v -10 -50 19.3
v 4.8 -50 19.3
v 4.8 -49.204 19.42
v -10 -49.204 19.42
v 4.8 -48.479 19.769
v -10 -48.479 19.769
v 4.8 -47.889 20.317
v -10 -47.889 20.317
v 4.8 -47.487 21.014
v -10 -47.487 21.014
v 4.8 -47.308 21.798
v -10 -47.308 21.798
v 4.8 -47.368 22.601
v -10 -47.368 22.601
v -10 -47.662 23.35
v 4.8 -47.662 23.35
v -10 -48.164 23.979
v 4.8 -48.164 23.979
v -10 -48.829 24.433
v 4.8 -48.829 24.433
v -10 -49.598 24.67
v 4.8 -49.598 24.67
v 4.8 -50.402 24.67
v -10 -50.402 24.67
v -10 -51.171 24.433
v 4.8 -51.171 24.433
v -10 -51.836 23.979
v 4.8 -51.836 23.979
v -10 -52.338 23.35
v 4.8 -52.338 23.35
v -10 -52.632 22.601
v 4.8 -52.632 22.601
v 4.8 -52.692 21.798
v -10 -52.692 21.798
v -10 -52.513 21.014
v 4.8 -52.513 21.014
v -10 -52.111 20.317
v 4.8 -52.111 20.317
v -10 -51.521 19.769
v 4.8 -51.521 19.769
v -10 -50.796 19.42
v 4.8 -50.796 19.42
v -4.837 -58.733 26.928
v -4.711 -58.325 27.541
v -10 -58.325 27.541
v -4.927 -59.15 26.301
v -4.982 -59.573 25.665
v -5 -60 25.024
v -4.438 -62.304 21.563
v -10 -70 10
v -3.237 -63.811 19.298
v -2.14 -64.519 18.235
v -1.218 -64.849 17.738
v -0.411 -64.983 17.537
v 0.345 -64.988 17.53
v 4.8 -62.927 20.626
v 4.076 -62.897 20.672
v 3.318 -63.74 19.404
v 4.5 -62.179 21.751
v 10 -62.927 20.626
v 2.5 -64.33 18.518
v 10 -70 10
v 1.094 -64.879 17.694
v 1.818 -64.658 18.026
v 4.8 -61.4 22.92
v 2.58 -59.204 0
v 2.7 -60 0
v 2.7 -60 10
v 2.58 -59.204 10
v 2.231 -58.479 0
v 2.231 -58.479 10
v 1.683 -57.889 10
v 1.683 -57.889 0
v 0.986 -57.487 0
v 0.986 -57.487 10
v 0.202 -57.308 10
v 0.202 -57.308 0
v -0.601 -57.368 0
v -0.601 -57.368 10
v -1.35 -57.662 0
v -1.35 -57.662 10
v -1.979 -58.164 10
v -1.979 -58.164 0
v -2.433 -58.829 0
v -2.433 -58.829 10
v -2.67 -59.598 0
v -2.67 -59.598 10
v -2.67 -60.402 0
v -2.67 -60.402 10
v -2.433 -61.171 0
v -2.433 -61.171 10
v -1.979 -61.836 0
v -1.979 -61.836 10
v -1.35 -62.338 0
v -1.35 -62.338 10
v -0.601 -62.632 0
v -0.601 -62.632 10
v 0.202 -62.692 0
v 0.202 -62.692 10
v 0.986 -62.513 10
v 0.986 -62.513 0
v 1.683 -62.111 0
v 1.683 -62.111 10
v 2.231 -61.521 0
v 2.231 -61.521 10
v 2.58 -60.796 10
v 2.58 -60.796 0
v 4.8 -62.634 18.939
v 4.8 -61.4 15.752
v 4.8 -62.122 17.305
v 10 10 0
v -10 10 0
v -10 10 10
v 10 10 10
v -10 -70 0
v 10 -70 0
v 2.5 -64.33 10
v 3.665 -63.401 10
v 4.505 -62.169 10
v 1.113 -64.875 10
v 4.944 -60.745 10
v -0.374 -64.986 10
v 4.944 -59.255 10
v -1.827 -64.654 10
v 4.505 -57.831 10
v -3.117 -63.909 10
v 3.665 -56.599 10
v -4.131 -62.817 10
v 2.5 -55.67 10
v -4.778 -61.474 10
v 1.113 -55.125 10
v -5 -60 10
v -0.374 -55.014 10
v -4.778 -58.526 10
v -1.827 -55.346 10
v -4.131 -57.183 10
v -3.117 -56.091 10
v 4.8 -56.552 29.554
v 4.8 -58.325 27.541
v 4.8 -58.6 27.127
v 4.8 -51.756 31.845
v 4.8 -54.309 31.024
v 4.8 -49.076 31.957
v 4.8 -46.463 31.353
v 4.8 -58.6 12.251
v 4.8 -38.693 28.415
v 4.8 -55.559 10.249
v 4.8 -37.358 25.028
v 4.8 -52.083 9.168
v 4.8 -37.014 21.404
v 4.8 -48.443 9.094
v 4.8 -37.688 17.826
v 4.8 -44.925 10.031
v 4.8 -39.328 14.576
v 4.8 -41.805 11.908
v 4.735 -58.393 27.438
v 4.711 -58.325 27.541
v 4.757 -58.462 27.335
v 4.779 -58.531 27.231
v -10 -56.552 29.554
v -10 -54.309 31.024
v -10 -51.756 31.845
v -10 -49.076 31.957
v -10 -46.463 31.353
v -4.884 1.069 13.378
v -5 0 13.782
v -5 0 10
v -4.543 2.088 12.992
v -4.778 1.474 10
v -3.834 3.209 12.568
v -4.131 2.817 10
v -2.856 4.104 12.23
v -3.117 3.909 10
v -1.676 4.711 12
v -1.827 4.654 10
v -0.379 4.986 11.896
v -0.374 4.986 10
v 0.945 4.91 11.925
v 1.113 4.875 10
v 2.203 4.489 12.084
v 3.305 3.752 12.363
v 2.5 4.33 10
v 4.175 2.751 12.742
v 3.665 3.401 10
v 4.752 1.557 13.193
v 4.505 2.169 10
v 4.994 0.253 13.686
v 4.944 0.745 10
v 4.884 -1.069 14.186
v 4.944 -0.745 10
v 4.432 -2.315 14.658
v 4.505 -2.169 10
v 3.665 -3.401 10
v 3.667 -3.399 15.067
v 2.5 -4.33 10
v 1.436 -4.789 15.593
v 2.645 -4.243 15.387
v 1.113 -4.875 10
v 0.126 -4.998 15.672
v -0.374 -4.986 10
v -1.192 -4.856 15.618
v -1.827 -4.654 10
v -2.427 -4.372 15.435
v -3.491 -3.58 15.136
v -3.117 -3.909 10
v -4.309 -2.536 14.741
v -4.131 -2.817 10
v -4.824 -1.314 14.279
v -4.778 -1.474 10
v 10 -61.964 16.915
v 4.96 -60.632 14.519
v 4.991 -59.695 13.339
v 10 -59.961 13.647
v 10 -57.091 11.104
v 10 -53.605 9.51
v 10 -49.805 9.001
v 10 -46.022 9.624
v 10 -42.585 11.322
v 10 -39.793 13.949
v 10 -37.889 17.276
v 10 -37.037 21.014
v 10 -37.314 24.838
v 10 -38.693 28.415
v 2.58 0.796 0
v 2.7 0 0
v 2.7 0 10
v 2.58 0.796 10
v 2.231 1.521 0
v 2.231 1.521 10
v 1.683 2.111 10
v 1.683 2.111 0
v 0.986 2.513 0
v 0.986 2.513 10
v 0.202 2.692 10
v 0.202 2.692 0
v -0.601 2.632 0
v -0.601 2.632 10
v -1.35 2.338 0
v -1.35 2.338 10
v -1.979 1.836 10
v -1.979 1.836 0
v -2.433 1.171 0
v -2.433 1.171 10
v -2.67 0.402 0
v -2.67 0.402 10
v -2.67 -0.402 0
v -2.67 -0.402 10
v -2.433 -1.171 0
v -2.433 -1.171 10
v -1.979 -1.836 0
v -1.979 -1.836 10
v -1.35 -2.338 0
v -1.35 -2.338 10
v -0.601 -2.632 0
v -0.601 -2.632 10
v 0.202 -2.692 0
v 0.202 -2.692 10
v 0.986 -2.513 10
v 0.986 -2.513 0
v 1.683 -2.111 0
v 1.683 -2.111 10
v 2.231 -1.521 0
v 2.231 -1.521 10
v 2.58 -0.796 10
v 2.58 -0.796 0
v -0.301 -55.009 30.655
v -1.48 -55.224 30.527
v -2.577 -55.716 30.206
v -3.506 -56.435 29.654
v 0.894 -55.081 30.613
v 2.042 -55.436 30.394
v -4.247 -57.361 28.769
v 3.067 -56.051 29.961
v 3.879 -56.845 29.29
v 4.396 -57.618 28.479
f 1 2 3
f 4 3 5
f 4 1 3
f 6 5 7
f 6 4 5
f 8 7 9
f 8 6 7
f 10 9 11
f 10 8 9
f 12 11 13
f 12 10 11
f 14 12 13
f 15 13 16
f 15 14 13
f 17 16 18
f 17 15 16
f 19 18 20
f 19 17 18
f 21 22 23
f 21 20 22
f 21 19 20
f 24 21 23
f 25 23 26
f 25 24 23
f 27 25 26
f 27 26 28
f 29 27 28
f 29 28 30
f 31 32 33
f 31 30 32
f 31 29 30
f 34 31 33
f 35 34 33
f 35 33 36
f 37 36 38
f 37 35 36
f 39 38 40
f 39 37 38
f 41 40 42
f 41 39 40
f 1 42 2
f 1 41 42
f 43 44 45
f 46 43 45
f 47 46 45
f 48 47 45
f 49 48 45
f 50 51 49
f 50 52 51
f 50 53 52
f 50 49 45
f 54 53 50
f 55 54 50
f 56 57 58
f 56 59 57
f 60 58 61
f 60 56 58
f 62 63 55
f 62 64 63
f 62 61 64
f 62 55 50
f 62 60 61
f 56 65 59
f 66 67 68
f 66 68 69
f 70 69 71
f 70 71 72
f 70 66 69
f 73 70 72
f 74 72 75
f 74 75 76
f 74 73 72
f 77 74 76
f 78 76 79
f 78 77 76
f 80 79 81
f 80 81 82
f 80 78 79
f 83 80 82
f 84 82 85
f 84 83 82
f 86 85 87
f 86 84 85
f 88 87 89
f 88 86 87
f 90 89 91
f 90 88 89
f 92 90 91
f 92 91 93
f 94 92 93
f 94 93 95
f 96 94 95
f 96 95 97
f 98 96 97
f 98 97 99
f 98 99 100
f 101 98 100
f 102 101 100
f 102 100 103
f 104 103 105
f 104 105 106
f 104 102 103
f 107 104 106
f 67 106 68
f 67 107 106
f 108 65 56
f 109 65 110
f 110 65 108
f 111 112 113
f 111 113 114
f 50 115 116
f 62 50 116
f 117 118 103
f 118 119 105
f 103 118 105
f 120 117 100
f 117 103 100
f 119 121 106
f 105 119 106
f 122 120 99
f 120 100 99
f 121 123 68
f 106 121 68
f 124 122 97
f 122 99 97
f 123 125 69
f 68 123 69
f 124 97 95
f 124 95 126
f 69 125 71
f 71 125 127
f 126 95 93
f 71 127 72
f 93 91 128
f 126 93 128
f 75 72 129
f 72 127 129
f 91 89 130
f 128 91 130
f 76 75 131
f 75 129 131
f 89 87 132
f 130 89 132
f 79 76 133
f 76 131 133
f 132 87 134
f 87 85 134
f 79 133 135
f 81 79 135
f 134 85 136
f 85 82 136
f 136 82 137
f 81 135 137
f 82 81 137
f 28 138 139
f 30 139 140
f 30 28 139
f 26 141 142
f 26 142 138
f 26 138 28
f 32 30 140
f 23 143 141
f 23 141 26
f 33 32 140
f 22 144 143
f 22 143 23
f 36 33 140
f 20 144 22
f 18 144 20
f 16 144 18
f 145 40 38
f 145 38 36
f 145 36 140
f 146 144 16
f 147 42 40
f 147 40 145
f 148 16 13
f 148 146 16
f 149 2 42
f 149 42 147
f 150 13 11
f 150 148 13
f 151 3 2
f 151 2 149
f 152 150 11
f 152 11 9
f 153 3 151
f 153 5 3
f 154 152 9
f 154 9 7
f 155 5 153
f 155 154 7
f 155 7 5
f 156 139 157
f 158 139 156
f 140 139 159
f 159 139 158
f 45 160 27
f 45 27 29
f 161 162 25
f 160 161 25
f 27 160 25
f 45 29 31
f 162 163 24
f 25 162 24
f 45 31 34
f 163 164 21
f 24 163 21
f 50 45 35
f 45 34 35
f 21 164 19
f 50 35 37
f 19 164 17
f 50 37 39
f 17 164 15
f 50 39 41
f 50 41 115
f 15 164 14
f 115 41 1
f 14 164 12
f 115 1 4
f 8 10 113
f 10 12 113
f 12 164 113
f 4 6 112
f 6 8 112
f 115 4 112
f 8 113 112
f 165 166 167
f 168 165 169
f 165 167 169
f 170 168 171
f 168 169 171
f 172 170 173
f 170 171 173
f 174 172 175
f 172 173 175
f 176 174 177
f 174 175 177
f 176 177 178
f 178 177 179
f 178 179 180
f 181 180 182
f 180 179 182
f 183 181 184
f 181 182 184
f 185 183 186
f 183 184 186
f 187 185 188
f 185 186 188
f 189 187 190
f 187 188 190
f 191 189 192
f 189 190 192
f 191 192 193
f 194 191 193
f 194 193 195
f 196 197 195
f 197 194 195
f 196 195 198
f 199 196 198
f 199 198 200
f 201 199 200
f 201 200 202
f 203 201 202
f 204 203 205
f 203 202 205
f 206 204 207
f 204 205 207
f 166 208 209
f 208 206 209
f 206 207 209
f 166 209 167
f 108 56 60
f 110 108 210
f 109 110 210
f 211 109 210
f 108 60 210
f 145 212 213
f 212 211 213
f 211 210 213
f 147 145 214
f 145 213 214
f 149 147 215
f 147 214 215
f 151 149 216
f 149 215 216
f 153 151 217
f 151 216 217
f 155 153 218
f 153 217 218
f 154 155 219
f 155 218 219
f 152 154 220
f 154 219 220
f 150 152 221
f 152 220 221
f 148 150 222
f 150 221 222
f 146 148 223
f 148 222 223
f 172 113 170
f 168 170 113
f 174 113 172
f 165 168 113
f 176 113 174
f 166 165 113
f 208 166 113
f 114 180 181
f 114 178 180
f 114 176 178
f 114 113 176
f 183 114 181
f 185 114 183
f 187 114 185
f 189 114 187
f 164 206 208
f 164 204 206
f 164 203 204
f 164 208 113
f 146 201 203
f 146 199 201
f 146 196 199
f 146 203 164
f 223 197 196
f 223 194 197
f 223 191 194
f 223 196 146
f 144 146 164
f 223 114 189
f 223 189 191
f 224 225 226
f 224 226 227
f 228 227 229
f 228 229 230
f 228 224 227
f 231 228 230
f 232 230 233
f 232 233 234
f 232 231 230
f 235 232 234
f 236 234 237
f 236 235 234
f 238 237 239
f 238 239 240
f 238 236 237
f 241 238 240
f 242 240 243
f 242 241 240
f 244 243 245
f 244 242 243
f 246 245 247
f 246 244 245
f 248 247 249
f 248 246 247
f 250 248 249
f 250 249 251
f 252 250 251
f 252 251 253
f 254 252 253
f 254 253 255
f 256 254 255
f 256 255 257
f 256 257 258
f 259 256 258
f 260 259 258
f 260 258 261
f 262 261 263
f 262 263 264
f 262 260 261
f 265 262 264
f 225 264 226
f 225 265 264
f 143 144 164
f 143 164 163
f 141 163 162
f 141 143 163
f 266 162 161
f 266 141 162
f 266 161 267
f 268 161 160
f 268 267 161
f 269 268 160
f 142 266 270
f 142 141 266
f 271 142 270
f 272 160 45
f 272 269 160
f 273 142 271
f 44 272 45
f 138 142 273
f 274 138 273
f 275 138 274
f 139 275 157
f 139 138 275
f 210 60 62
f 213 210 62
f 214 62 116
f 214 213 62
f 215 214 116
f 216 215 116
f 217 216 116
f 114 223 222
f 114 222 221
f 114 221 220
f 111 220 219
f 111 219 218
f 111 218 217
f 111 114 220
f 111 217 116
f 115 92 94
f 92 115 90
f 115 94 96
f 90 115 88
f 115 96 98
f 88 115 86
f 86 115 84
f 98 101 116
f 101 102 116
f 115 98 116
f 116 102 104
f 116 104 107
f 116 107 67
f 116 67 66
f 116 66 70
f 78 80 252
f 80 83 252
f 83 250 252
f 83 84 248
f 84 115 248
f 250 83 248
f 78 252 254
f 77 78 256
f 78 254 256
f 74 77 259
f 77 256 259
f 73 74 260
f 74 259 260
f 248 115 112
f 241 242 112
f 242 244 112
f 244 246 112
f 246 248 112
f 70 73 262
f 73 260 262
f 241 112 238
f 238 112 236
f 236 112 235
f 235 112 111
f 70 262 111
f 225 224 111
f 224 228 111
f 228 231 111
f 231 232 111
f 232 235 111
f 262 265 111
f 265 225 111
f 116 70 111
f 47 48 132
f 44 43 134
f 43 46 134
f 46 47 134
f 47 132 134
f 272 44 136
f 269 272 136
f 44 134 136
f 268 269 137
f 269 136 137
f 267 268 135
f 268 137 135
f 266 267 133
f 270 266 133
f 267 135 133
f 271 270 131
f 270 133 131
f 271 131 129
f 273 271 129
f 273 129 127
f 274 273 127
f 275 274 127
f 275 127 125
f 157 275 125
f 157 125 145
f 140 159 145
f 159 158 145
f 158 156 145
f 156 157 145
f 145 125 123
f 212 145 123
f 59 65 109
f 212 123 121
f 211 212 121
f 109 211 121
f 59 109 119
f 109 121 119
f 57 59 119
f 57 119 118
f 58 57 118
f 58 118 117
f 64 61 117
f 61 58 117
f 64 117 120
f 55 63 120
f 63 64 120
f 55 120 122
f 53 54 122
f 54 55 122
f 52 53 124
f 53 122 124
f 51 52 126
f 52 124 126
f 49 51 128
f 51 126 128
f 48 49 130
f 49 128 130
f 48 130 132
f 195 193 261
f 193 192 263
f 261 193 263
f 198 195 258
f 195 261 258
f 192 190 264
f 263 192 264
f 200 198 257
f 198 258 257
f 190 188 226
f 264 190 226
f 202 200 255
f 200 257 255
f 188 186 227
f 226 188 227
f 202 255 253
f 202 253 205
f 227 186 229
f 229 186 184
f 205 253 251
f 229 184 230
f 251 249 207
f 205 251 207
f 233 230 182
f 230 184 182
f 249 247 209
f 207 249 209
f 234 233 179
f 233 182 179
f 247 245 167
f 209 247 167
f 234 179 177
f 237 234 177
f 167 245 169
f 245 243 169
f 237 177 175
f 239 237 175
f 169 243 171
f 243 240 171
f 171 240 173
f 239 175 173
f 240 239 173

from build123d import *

# Parameters (mm, degrees)
SKETCH1_W           = 20
SKETCH1_H           = 80
SKETCH1_R           = 2.7
BOSS_EXTRUDE1_DEPTH = 10
SKETCH2_R           = 2.7
BOSS_EXTRUDE2_DEPTH = 10
SKETCH3_R           = 5
CUT_EXTRUDE1_DEPTH  = 23
SKETCH4_R           = 13
CUT_EXTRUDE2_DEPTH  = 5.2


with BuildPart() as part:
    # Sketch1 → Boss-Extrude1 (new body)
    with BuildSketch(Plane.XY):
        with Locations((0, -30)):
            Rectangle(SKETCH1_W, SKETCH1_H)
        Circle(SKETCH1_R, mode=Mode.SUBTRACT)
        with Locations((0, -60)):
            Circle(SKETCH1_R, mode=Mode.SUBTRACT)
    extrude(amount=BOSS_EXTRUDE1_DEPTH)

    # Sketch2 → Boss-Extrude2 (add, symmetric)
    with BuildSketch(Plane(origin=(0, 0, 0), x_dir=(0, 0, -1), z_dir=(1, 0, 0))):
        with BuildLine():
            Line((-10, 10), (-31.353454021, -46.462642529))
            ThreePointArc((-31.353454021, -46.462642529), (-31.520338182, -53.05992825), (-27.540921877, -58.324553126))
            Line((-27.540921877, -58.324553126), (-10, -70))
            Line((-10, -70), (-10, 10))
        make_face()
        with Locations((-22, -50)):
            Circle(SKETCH2_R, mode=Mode.SUBTRACT)
    extrude(amount=BOSS_EXTRUDE2_DEPTH, both=True)

    # Sketch3 → Cut-Extrude1 (cut, through all)
    with BuildSketch(Plane(origin=(0, 0, 10), x_dir=(-1, 0, 0), z_dir=(0, 0, -1))):
        with Locations((0, -60)):
            Circle(SKETCH3_R)
        Circle(SKETCH3_R)
    extrude(amount=-CUT_EXTRUDE1_DEPTH, mode=Mode.SUBTRACT)

    # Sketch4 → Cut-Extrude2 (cut)
    with BuildSketch(Plane(origin=(10, 0, 0), x_dir=(0, 0, -1), z_dir=(1, 0, 0))):
        with Locations((-22, -50)):
            Circle(SKETCH4_R)
    extrude(amount=-CUT_EXTRUDE2_DEPTH, mode=Mode.SUBTRACT)


solid = part.part
